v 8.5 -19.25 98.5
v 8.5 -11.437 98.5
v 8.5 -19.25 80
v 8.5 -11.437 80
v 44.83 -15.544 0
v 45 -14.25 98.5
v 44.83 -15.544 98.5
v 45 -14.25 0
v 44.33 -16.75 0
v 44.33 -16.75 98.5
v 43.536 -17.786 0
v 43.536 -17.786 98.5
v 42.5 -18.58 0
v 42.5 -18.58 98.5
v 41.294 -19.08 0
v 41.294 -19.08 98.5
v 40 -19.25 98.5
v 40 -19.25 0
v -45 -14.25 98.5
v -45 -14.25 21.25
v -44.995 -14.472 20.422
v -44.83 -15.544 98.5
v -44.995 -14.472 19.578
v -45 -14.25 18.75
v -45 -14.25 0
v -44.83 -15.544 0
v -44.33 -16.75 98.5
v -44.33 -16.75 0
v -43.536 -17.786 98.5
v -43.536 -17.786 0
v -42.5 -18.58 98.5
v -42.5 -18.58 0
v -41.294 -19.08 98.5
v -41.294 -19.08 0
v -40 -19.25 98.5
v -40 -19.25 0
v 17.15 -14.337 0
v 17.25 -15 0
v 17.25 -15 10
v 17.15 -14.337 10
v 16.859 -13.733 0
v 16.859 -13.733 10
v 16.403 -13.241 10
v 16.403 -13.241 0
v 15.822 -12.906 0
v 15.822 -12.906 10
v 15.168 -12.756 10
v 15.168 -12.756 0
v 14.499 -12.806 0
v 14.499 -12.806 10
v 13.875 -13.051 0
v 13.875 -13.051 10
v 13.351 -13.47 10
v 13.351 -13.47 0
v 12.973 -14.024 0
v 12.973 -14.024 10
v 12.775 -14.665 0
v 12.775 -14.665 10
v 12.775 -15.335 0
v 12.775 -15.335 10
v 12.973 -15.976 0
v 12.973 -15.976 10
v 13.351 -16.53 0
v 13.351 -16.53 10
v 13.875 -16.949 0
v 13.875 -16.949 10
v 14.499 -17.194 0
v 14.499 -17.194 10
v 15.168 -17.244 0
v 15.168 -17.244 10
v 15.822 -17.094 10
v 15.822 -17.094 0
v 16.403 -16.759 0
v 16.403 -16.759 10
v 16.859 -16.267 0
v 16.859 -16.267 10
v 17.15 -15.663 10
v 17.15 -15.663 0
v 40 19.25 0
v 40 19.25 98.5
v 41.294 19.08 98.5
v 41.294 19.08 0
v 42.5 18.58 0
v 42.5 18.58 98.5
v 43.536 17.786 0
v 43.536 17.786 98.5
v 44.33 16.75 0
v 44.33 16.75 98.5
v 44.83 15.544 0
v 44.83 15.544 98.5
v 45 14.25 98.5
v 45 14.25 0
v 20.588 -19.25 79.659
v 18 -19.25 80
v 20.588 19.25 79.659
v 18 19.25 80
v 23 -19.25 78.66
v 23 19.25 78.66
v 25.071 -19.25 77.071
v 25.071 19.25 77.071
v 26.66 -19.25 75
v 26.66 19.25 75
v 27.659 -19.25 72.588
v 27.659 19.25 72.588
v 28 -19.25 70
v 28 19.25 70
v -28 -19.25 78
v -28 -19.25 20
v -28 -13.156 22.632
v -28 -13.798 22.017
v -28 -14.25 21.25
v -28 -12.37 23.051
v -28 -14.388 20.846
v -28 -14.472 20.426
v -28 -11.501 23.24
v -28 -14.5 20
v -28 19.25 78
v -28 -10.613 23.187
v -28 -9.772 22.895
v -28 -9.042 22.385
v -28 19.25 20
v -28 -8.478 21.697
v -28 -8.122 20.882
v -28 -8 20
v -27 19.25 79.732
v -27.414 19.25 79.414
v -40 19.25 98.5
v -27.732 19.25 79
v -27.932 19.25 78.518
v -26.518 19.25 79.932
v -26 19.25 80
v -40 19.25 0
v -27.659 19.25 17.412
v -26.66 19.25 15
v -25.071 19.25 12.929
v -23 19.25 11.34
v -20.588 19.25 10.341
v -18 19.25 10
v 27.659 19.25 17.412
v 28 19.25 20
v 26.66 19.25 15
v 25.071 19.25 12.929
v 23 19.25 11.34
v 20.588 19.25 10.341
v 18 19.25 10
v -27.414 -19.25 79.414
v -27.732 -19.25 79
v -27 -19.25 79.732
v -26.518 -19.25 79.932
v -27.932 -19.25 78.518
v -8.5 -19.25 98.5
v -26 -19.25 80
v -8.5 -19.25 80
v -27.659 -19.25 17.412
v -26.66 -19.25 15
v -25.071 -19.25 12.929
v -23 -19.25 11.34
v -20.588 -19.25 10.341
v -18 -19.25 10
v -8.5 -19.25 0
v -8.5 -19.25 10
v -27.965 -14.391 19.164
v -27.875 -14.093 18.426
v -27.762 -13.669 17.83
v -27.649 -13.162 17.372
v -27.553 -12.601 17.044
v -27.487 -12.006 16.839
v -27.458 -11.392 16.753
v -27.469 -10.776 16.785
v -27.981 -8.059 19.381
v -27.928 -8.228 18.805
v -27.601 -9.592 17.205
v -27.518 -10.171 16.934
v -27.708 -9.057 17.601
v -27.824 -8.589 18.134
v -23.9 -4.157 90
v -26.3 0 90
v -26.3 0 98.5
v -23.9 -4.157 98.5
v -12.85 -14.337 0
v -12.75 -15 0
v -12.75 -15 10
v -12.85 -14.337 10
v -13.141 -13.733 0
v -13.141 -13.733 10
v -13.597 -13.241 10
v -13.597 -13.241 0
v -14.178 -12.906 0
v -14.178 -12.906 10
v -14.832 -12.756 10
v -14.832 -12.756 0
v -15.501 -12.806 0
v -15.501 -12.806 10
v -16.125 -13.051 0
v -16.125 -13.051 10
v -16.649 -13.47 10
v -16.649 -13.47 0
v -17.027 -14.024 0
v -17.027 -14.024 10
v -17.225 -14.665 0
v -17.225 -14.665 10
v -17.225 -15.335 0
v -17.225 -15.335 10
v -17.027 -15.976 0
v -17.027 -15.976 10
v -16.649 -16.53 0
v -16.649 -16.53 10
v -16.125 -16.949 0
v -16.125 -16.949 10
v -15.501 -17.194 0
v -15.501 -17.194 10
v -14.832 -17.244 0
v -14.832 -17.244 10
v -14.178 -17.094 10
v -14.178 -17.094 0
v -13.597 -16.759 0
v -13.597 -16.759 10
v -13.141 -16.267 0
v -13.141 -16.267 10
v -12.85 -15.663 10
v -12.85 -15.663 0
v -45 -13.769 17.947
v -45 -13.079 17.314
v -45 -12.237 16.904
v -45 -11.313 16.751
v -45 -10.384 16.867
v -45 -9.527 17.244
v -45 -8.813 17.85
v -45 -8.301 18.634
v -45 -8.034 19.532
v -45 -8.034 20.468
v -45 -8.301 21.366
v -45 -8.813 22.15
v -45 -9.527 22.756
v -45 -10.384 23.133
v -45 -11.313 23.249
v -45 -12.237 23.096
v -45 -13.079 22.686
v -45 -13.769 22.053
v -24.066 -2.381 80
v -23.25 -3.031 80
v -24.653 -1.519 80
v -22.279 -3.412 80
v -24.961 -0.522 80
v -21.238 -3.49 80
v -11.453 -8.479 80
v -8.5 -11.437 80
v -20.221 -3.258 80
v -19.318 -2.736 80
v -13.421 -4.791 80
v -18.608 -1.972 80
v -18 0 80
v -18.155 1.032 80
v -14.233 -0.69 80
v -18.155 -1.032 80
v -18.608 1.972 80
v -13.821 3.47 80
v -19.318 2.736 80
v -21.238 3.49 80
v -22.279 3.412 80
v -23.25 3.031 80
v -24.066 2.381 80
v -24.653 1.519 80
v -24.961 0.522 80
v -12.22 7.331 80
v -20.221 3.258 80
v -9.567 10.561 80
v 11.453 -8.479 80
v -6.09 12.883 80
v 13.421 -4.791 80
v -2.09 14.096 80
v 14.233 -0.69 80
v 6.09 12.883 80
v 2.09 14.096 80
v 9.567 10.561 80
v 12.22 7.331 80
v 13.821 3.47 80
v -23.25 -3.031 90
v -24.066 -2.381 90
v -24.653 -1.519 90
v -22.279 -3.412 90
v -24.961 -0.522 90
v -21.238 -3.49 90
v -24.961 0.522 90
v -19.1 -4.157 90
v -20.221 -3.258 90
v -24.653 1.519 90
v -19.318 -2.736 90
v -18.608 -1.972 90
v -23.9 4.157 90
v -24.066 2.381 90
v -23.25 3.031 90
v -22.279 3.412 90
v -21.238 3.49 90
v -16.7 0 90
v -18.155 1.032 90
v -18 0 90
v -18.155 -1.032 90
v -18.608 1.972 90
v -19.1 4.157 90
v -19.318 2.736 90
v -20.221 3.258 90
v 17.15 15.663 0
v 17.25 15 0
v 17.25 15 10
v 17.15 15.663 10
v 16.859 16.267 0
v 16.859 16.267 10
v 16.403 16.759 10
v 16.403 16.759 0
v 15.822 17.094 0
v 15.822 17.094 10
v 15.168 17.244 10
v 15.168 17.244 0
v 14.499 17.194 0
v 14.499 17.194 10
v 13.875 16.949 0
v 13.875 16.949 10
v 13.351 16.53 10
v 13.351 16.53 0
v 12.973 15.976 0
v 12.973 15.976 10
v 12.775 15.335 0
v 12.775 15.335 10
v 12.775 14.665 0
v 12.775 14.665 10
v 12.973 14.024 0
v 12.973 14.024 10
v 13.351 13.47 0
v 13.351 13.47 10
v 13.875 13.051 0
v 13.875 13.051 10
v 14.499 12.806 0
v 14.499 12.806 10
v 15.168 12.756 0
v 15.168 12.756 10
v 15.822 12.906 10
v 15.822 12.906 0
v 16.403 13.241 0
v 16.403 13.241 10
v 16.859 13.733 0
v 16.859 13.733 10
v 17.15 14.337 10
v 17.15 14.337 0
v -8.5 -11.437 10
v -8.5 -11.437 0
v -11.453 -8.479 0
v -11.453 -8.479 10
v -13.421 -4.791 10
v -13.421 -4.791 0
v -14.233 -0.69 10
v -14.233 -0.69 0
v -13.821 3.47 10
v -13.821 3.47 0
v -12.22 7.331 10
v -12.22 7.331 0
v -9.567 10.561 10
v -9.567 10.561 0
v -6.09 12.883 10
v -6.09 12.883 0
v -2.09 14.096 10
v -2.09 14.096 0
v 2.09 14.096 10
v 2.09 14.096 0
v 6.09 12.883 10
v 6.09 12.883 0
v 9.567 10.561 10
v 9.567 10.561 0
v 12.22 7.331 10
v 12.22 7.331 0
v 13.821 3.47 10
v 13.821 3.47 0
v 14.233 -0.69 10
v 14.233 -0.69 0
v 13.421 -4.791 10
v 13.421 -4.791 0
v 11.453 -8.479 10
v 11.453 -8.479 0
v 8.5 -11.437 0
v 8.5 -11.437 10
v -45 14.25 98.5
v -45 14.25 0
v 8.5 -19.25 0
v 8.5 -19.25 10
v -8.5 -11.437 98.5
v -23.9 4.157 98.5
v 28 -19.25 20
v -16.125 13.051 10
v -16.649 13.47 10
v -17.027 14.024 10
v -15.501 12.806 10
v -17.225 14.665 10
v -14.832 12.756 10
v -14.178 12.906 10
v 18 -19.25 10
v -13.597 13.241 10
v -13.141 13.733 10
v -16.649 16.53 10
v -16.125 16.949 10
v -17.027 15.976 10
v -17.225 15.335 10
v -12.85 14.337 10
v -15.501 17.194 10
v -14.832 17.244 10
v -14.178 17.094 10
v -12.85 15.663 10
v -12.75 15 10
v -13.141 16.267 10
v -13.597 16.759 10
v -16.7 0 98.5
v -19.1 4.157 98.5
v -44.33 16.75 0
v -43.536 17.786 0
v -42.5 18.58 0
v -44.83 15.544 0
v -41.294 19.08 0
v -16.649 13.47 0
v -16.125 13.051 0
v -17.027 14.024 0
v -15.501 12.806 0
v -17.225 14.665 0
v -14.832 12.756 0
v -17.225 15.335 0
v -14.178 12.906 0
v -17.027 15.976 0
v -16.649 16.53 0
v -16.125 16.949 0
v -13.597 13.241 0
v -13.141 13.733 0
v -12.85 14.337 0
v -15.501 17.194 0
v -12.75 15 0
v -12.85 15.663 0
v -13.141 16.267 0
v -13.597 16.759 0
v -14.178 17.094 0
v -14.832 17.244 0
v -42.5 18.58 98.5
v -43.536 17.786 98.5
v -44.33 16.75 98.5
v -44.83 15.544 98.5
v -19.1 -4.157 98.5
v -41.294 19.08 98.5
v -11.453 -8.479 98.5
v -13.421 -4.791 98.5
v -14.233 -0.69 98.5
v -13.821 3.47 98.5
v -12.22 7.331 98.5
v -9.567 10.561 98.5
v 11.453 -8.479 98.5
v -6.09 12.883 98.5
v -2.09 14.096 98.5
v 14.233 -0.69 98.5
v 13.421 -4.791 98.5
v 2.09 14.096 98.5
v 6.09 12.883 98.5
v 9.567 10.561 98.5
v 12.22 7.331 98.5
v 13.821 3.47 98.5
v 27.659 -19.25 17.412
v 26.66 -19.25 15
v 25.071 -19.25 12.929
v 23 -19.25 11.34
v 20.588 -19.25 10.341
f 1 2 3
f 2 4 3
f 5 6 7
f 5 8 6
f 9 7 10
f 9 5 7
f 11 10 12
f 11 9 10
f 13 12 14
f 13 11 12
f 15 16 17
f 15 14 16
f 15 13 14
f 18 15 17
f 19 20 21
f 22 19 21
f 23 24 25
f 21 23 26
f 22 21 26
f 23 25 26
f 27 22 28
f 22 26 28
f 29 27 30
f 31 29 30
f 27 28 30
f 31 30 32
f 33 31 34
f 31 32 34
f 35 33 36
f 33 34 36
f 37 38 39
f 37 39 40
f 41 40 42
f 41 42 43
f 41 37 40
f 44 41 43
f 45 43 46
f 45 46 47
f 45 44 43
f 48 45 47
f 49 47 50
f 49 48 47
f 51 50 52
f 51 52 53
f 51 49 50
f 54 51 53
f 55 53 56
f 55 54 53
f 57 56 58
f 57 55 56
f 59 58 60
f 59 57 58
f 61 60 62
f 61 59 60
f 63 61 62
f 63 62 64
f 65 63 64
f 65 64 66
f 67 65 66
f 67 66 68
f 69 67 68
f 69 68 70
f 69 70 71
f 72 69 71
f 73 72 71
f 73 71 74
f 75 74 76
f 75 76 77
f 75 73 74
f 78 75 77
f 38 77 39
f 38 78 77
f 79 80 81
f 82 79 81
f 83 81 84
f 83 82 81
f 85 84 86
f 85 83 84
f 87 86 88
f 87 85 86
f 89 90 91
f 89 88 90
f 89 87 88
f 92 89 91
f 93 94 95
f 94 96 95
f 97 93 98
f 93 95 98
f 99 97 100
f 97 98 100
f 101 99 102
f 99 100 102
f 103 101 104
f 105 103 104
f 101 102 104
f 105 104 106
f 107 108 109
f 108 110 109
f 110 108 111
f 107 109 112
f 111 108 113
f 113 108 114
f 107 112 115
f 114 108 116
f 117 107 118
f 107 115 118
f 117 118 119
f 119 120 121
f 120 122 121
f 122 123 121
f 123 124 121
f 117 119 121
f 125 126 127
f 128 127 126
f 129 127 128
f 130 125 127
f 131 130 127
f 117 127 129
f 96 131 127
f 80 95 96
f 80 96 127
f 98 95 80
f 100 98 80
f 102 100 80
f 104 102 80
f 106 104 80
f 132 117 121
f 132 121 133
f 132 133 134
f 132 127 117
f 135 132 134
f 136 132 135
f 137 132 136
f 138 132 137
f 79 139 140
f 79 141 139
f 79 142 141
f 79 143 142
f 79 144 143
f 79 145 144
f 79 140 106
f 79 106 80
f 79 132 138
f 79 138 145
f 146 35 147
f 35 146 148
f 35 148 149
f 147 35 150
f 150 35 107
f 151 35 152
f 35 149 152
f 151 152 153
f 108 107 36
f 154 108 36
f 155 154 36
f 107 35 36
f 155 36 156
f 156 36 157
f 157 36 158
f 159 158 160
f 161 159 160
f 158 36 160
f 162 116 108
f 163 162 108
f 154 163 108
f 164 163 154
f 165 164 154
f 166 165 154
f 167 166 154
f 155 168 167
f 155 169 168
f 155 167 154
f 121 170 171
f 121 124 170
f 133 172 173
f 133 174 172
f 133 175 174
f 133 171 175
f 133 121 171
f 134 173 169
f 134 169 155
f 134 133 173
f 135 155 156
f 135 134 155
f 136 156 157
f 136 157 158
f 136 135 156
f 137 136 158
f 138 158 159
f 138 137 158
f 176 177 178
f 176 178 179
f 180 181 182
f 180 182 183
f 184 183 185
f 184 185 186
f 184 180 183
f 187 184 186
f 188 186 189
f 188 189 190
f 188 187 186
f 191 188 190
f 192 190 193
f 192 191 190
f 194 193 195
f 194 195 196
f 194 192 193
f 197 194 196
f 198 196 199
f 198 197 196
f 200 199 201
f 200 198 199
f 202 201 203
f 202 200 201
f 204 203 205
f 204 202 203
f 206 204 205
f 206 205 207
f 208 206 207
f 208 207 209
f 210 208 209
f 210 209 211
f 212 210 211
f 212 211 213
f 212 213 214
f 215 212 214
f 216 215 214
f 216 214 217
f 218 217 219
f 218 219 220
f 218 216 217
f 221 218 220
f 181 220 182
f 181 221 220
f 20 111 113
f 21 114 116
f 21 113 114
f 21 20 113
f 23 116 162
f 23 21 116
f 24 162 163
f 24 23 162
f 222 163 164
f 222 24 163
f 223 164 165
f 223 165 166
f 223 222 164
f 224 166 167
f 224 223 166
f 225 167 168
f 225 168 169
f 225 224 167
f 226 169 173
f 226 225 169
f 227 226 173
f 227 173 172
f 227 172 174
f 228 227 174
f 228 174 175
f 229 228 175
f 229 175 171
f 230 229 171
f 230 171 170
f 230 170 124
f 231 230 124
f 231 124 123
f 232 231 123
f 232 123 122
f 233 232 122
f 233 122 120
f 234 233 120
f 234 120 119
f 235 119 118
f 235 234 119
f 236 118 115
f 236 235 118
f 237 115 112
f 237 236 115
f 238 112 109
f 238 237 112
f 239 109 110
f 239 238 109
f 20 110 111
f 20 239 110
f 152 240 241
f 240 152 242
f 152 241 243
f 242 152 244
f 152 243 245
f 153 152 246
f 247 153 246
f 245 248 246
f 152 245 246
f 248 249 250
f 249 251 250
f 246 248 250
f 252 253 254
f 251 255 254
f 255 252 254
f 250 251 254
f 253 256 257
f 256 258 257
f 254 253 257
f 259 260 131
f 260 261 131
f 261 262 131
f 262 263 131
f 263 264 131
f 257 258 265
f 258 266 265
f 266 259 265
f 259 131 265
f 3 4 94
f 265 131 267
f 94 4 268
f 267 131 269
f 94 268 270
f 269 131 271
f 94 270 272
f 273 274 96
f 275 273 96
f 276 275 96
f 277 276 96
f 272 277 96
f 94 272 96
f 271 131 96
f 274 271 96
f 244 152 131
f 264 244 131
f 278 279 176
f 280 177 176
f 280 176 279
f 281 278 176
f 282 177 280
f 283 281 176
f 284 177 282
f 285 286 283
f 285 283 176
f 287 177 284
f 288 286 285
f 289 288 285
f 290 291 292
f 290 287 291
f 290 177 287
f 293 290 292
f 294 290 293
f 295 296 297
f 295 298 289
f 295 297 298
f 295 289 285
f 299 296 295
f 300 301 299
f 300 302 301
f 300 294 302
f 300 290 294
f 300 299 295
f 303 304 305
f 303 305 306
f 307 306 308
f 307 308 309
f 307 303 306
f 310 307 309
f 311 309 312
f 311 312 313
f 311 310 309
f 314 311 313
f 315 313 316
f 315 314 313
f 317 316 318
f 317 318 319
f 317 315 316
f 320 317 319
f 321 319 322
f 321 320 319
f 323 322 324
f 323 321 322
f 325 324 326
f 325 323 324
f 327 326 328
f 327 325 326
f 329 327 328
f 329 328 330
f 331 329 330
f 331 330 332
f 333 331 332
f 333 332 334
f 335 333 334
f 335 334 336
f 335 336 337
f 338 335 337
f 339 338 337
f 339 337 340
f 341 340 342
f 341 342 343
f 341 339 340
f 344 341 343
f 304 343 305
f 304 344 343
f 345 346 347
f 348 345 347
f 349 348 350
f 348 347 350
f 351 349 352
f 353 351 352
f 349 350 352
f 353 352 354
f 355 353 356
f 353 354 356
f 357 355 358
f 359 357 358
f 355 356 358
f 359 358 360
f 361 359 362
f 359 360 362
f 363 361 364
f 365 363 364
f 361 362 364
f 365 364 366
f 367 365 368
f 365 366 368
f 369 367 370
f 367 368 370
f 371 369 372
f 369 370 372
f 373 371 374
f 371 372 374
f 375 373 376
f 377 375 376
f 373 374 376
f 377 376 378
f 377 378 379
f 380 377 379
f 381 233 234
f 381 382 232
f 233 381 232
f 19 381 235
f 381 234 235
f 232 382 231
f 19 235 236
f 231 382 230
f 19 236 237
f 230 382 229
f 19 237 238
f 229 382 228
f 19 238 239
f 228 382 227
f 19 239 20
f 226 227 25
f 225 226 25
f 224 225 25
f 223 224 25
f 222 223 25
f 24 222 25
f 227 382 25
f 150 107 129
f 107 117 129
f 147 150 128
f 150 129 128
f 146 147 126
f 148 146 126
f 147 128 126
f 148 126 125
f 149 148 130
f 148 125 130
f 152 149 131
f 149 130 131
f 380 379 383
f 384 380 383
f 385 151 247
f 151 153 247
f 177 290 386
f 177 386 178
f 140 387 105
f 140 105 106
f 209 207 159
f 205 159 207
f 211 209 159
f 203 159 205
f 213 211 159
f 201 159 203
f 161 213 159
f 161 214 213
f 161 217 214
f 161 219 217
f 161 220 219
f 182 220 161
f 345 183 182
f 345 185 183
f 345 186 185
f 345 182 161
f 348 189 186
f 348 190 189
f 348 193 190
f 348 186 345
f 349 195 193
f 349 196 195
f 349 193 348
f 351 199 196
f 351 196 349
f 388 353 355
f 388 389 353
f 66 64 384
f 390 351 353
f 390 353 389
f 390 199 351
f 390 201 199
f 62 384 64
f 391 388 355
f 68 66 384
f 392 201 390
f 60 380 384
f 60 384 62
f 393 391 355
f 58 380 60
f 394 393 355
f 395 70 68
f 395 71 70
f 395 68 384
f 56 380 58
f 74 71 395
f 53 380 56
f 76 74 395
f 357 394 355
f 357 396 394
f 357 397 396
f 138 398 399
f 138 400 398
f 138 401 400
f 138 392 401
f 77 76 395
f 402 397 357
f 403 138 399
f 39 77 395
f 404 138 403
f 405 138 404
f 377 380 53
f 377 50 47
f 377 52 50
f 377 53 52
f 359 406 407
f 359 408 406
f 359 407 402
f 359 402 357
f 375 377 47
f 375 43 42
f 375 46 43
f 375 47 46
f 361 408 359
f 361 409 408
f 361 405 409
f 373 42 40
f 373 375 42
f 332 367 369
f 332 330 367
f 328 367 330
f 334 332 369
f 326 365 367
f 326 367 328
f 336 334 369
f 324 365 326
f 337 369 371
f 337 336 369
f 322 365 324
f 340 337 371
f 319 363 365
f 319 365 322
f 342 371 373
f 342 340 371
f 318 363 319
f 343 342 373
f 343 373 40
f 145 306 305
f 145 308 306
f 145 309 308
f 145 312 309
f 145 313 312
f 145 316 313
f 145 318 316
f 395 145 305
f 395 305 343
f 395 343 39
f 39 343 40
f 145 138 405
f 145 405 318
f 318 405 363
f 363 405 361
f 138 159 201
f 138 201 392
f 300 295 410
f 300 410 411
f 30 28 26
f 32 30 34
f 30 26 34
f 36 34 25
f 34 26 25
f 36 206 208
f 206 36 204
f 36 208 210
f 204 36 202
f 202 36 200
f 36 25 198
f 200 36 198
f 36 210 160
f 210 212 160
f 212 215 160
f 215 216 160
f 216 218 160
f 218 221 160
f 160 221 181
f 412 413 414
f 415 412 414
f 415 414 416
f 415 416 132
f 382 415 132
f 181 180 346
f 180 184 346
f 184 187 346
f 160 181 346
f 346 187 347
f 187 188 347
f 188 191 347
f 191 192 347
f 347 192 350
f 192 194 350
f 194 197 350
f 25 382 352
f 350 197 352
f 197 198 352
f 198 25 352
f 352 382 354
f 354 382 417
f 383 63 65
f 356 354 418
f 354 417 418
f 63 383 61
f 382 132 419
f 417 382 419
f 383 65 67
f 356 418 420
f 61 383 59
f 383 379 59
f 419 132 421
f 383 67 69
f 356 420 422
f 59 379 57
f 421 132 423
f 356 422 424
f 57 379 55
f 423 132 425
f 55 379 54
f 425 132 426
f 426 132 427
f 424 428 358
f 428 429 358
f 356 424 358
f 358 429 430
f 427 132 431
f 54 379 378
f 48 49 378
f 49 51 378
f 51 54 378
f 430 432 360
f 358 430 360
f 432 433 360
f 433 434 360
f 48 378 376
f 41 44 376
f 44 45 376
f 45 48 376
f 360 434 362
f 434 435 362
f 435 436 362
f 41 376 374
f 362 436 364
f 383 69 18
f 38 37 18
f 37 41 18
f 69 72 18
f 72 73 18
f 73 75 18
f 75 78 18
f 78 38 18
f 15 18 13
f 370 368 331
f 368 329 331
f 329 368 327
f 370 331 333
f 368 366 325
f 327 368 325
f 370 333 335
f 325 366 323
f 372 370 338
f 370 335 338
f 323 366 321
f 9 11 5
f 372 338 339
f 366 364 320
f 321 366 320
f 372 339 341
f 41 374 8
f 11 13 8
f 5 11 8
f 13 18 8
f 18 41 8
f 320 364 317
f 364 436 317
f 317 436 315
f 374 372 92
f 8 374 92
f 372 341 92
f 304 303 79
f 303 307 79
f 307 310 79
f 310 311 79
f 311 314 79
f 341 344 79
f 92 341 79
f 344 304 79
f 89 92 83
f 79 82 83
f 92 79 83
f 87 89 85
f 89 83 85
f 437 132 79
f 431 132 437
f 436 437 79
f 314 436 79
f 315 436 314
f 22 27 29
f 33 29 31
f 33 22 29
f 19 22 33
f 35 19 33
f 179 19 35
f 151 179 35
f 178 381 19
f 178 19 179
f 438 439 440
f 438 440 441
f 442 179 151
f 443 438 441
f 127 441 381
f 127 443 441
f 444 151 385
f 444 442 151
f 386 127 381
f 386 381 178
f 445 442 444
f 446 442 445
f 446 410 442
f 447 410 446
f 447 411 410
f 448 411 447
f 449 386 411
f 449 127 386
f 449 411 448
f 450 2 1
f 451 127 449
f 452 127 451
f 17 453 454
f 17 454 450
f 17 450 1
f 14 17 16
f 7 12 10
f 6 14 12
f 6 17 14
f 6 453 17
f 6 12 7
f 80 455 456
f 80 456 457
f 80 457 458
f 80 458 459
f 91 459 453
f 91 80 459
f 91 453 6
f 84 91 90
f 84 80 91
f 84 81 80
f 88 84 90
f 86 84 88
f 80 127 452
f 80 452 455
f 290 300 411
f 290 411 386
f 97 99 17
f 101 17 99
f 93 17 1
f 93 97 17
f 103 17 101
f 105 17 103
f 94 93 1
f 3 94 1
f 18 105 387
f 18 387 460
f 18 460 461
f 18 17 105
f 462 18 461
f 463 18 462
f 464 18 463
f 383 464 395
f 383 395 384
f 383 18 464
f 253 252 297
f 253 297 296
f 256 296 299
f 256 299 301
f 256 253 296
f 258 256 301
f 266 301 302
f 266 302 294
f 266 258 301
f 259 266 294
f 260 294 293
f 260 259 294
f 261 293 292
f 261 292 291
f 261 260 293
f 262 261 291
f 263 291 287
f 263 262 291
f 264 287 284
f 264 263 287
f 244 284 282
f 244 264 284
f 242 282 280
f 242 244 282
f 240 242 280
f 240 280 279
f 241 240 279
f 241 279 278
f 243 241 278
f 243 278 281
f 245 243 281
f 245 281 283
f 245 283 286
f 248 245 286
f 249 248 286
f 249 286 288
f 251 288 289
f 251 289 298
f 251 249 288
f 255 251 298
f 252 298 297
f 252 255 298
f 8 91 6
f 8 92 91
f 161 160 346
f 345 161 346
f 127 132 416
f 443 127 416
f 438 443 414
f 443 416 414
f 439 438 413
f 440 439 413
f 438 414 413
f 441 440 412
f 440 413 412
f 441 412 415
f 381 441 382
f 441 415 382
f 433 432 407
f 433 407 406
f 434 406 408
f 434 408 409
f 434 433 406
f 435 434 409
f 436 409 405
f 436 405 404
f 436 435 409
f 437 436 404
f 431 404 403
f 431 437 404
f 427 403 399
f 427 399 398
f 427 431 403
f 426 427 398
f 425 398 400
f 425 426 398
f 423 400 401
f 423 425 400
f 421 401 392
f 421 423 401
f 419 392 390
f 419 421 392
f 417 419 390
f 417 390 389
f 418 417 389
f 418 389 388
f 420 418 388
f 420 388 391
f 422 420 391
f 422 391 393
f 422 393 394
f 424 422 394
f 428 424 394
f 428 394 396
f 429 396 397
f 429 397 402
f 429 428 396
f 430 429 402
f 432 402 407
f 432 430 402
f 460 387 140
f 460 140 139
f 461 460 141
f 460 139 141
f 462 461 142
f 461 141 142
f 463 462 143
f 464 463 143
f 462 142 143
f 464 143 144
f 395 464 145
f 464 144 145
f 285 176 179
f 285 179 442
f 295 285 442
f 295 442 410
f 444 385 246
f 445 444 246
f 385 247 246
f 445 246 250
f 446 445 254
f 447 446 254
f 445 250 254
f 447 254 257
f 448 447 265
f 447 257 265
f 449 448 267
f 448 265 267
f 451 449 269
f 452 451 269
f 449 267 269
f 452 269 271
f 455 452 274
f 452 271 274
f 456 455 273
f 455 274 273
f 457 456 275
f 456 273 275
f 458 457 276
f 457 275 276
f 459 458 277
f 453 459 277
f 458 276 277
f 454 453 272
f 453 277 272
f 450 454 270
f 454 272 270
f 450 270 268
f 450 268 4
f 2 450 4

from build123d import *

# Parameters (mm, degrees)
SKETCH1_R               = 2.25
BOSS_EXTRUDE1_DEPTH     = 10
BOSS_EXTRUDE3_DEPTH     = 70
BOSS_EXTRUDE3_2_DEPTH   = 70
SKETCH4_R               = 3.5
BOSS_EXTRUDE4_DEPTH     = 10
BOSS_EXTRUDE5_DEPTH     = 8.5
FILLET2_R               = 2
FILLET3_R               = 10
CUT_EXTRUDE1_DEPTH      = 10
CUT_EXTRUDE1_DEPTH_BACK = 125.104039016
SKETCH7_R               = 3.25


with BuildPart() as part:
    # Sketch1 → Boss-Extrude1 (new body)
    with BuildSketch(Plane.XY):
        with BuildLine():
            Line((15, 19.25), (-15, 19.25))
            Line((-15, 19.25), (-30, 19.25))
            Line((-30, 19.25), (-40, 19.25))
            ThreePointArc((-40, 19.25), (-43.535533906, 17.785533906), (-45, 14.25))
            Line((-45, 14.25), (-45, -14.25))
            ThreePointArc((-45, -14.25), (-43.535533906, -17.785533906), (-40, -19.25))
            Line((-40, -19.25), (-30, -19.25))
            Line((-30, -19.25), (-15, -19.25))
            Line((-15, -19.25), (-8.5, -19.25))
            Line((-8.5, -19.25), (-8.5, -16.75))
            Line((-8.5, -16.75), (-8.5, -11.437329234))
            ThreePointArc((-8.5, -11.437329234), (0, 14.25), (8.5, -11.437329234))
            Line((8.5, -11.437329234), (8.5, -16.75))
            Line((8.5, -16.75), (8.5, -19.25))
            Line((8.5, -19.25), (15, -19.25))
            Line((15, -19.25), (30, -19.25))
            Line((30, -19.25), (40, -19.25))
            ThreePointArc((40, -19.25), (43.535533906, -17.785533906), (45, -14.25))
            Line((45, -14.25), (45, 14.25))
            ThreePointArc((45, 14.25), (43.535533906, 17.785533906), (40, 19.25))
            Line((40, 19.25), (30, 19.25))
            Line((30, 19.25), (15, 19.25))
        make_face()
        with Locations((-15, -15)):
            Circle(SKETCH1_R, mode=Mode.SUBTRACT)
        with Locations((15, -15)):
            Circle(SKETCH1_R, mode=Mode.SUBTRACT)
        with Locations((-15, 15)):
            Circle(SKETCH1_R, mode=Mode.SUBTRACT)
        with Locations((15, 15)):
            Circle(SKETCH1_R, mode=Mode.SUBTRACT)
    extrude(amount=BOSS_EXTRUDE1_DEPTH)


with BuildPart() as body_2:
    # Sketch2 → Boss-Extrude3 (new body)
    with BuildSketch(Plane.XY.offset(10)):
        with BuildLine():
            Line((-45, 14.25), (-45, -14.25))
            ThreePointArc((-45, -14.25), (-43.535533906, -17.785533906), (-40, -19.25))
            Line((-40, -19.25), (-28, -19.25))
            Line((-28, -19.25), (-28, 0))
            Line((-28, 0), (-28, 19.25))
            Line((-28, 19.25), (-40, 19.25))
            ThreePointArc((-40, 19.25), (-43.535533906, 17.785533906), (-45, 14.25))
        make_face()
    extrude(amount=BOSS_EXTRUDE3_DEPTH)

    # Sketch4 → Boss-Extrude4 (add)
    with BuildSketch(Plane.XY.offset(80)):
        with BuildLine():
            Line((-45, 14.25), (-45, -14.25))
            ThreePointArc((-45, -14.25), (-43.535533906, -17.785533906), (-40, -19.25))
            Line((-40, -19.25), (-8.5, -19.25))
            Line((-8.5, -19.25), (-8.5, -11.437329234))
            ThreePointArc((-8.5, -11.437329234), (0, 14.25), (8.5, -11.437329234))
            Line((8.5, -11.437329234), (8.5, -19.25))
            Line((8.5, -19.25), (40, -19.25))
            ThreePointArc((40, -19.25), (43.535533906, -17.785533906), (45, -14.25))
            Line((45, -14.25), (45, 14.25))
            ThreePointArc((45, 14.25), (43.535533906, 17.785533906), (40, 19.25))
            Line((40, 19.25), (-40, 19.25))
            ThreePointArc((-40, 19.25), (-43.535533906, 17.785533906), (-45, 14.25))
        make_face()
        with Locations((-21.5, 0)):
            Circle(SKETCH4_R, mode=Mode.SUBTRACT)
    extrude(amount=BOSS_EXTRUDE4_DEPTH)

    # Sketch6 → Boss-Extrude5 (add)
    with BuildSketch(Plane.XY.offset(90)):
        with BuildLine():
            Line((-40, -19.25), (-8.5, -19.25))
            Line((-8.5, -19.25), (-8.5, -11.437329234))
            ThreePointArc((-8.5, -11.437329234), (0, 14.25), (8.5, -11.437329234))
            Line((8.5, -11.437329234), (8.5, -19.25))
            Line((8.5, -19.25), (40, -19.25))
            ThreePointArc((40, -19.25), (43.535533906, -17.785533906), (45, -14.25))
            Line((45, -14.25), (45, 14.25))
            ThreePointArc((45, 14.25), (43.535533906, 17.785533906), (40, 19.25))
            Line((40, 19.25), (-40, 19.25))
            ThreePointArc((-40, 19.25), (-43.535533906, 17.785533906), (-45, 14.25))
            Line((-45, 14.25), (-45, -14.25))
            ThreePointArc((-45, -14.25), (-43.535533906, -17.785533906), (-40, -19.25))
        make_face()
        Polygon((-16.7, 0), (-19.1, 4.156921938), (-23.9, 4.156921938), (-26.3, 0), (-23.9, -4.156921938), (-19.1, -4.156921938), align=None, mode=Mode.SUBTRACT)
    extrude(amount=BOSS_EXTRUDE5_DEPTH)


with BuildPart() as body_3:
    # Sketch2 → Boss-Extrude3 2 (new body)
    with BuildSketch(Plane.XY.offset(10)):
        with BuildLine():
            Line((40, -19.25), (28, -19.25))
            Line((28, -19.25), (28, 0))
            Line((28, 0), (28, 19.25))
            Line((28, 19.25), (40, 19.25))
            ThreePointArc((40, 19.25), (43.535533906, 17.785533906), (45, 14.25))
            Line((45, 14.25), (45, -14.25))
            ThreePointArc((45, -14.25), (43.535533906, -17.785533906), (40, -19.25))
        make_face()
    extrude(amount=BOSS_EXTRUDE3_2_DEPTH)


with BuildPart() as part_1:
    add(part.part)

    # Combine1: union body 2, body 3
    add(body_2.part)
    add(body_3.part)

    # Fillet2
    fillet2_edges = [part_1.edges().sort_by_distance(p)[0] for p in [
        (-28, 0, 80),
    ]]
    fillet(fillet2_edges, radius=FILLET2_R)

    # Fillet3
    fillet3_edges = [part_1.edges().sort_by_distance(p)[0] for p in [
        (28, 0, 80),
        (-28, 0, 10),
        (28, 0, 10),
    ]]
    fillet(fillet3_edges, radius=FILLET3_R)

    # Sketch7 → Cut-Extrude1 (cut, two sides: drawn at the far end of the back side and taken through both)
    with BuildSketch(Plane(origin=(-28, 0, 0), x_dir=(0, 0, -1), z_dir=(1, 0, 0)).offset(-CUT_EXTRUDE1_DEPTH_BACK)):
        with Locations(Location((-20, -11.25, 0), (0, 0, 247.380135052))):
            Circle(SKETCH7_R)
    extrude(amount=CUT_EXTRUDE1_DEPTH + CUT_EXTRUDE1_DEPTH_BACK, mode=Mode.SUBTRACT)


solid = part_1.part
